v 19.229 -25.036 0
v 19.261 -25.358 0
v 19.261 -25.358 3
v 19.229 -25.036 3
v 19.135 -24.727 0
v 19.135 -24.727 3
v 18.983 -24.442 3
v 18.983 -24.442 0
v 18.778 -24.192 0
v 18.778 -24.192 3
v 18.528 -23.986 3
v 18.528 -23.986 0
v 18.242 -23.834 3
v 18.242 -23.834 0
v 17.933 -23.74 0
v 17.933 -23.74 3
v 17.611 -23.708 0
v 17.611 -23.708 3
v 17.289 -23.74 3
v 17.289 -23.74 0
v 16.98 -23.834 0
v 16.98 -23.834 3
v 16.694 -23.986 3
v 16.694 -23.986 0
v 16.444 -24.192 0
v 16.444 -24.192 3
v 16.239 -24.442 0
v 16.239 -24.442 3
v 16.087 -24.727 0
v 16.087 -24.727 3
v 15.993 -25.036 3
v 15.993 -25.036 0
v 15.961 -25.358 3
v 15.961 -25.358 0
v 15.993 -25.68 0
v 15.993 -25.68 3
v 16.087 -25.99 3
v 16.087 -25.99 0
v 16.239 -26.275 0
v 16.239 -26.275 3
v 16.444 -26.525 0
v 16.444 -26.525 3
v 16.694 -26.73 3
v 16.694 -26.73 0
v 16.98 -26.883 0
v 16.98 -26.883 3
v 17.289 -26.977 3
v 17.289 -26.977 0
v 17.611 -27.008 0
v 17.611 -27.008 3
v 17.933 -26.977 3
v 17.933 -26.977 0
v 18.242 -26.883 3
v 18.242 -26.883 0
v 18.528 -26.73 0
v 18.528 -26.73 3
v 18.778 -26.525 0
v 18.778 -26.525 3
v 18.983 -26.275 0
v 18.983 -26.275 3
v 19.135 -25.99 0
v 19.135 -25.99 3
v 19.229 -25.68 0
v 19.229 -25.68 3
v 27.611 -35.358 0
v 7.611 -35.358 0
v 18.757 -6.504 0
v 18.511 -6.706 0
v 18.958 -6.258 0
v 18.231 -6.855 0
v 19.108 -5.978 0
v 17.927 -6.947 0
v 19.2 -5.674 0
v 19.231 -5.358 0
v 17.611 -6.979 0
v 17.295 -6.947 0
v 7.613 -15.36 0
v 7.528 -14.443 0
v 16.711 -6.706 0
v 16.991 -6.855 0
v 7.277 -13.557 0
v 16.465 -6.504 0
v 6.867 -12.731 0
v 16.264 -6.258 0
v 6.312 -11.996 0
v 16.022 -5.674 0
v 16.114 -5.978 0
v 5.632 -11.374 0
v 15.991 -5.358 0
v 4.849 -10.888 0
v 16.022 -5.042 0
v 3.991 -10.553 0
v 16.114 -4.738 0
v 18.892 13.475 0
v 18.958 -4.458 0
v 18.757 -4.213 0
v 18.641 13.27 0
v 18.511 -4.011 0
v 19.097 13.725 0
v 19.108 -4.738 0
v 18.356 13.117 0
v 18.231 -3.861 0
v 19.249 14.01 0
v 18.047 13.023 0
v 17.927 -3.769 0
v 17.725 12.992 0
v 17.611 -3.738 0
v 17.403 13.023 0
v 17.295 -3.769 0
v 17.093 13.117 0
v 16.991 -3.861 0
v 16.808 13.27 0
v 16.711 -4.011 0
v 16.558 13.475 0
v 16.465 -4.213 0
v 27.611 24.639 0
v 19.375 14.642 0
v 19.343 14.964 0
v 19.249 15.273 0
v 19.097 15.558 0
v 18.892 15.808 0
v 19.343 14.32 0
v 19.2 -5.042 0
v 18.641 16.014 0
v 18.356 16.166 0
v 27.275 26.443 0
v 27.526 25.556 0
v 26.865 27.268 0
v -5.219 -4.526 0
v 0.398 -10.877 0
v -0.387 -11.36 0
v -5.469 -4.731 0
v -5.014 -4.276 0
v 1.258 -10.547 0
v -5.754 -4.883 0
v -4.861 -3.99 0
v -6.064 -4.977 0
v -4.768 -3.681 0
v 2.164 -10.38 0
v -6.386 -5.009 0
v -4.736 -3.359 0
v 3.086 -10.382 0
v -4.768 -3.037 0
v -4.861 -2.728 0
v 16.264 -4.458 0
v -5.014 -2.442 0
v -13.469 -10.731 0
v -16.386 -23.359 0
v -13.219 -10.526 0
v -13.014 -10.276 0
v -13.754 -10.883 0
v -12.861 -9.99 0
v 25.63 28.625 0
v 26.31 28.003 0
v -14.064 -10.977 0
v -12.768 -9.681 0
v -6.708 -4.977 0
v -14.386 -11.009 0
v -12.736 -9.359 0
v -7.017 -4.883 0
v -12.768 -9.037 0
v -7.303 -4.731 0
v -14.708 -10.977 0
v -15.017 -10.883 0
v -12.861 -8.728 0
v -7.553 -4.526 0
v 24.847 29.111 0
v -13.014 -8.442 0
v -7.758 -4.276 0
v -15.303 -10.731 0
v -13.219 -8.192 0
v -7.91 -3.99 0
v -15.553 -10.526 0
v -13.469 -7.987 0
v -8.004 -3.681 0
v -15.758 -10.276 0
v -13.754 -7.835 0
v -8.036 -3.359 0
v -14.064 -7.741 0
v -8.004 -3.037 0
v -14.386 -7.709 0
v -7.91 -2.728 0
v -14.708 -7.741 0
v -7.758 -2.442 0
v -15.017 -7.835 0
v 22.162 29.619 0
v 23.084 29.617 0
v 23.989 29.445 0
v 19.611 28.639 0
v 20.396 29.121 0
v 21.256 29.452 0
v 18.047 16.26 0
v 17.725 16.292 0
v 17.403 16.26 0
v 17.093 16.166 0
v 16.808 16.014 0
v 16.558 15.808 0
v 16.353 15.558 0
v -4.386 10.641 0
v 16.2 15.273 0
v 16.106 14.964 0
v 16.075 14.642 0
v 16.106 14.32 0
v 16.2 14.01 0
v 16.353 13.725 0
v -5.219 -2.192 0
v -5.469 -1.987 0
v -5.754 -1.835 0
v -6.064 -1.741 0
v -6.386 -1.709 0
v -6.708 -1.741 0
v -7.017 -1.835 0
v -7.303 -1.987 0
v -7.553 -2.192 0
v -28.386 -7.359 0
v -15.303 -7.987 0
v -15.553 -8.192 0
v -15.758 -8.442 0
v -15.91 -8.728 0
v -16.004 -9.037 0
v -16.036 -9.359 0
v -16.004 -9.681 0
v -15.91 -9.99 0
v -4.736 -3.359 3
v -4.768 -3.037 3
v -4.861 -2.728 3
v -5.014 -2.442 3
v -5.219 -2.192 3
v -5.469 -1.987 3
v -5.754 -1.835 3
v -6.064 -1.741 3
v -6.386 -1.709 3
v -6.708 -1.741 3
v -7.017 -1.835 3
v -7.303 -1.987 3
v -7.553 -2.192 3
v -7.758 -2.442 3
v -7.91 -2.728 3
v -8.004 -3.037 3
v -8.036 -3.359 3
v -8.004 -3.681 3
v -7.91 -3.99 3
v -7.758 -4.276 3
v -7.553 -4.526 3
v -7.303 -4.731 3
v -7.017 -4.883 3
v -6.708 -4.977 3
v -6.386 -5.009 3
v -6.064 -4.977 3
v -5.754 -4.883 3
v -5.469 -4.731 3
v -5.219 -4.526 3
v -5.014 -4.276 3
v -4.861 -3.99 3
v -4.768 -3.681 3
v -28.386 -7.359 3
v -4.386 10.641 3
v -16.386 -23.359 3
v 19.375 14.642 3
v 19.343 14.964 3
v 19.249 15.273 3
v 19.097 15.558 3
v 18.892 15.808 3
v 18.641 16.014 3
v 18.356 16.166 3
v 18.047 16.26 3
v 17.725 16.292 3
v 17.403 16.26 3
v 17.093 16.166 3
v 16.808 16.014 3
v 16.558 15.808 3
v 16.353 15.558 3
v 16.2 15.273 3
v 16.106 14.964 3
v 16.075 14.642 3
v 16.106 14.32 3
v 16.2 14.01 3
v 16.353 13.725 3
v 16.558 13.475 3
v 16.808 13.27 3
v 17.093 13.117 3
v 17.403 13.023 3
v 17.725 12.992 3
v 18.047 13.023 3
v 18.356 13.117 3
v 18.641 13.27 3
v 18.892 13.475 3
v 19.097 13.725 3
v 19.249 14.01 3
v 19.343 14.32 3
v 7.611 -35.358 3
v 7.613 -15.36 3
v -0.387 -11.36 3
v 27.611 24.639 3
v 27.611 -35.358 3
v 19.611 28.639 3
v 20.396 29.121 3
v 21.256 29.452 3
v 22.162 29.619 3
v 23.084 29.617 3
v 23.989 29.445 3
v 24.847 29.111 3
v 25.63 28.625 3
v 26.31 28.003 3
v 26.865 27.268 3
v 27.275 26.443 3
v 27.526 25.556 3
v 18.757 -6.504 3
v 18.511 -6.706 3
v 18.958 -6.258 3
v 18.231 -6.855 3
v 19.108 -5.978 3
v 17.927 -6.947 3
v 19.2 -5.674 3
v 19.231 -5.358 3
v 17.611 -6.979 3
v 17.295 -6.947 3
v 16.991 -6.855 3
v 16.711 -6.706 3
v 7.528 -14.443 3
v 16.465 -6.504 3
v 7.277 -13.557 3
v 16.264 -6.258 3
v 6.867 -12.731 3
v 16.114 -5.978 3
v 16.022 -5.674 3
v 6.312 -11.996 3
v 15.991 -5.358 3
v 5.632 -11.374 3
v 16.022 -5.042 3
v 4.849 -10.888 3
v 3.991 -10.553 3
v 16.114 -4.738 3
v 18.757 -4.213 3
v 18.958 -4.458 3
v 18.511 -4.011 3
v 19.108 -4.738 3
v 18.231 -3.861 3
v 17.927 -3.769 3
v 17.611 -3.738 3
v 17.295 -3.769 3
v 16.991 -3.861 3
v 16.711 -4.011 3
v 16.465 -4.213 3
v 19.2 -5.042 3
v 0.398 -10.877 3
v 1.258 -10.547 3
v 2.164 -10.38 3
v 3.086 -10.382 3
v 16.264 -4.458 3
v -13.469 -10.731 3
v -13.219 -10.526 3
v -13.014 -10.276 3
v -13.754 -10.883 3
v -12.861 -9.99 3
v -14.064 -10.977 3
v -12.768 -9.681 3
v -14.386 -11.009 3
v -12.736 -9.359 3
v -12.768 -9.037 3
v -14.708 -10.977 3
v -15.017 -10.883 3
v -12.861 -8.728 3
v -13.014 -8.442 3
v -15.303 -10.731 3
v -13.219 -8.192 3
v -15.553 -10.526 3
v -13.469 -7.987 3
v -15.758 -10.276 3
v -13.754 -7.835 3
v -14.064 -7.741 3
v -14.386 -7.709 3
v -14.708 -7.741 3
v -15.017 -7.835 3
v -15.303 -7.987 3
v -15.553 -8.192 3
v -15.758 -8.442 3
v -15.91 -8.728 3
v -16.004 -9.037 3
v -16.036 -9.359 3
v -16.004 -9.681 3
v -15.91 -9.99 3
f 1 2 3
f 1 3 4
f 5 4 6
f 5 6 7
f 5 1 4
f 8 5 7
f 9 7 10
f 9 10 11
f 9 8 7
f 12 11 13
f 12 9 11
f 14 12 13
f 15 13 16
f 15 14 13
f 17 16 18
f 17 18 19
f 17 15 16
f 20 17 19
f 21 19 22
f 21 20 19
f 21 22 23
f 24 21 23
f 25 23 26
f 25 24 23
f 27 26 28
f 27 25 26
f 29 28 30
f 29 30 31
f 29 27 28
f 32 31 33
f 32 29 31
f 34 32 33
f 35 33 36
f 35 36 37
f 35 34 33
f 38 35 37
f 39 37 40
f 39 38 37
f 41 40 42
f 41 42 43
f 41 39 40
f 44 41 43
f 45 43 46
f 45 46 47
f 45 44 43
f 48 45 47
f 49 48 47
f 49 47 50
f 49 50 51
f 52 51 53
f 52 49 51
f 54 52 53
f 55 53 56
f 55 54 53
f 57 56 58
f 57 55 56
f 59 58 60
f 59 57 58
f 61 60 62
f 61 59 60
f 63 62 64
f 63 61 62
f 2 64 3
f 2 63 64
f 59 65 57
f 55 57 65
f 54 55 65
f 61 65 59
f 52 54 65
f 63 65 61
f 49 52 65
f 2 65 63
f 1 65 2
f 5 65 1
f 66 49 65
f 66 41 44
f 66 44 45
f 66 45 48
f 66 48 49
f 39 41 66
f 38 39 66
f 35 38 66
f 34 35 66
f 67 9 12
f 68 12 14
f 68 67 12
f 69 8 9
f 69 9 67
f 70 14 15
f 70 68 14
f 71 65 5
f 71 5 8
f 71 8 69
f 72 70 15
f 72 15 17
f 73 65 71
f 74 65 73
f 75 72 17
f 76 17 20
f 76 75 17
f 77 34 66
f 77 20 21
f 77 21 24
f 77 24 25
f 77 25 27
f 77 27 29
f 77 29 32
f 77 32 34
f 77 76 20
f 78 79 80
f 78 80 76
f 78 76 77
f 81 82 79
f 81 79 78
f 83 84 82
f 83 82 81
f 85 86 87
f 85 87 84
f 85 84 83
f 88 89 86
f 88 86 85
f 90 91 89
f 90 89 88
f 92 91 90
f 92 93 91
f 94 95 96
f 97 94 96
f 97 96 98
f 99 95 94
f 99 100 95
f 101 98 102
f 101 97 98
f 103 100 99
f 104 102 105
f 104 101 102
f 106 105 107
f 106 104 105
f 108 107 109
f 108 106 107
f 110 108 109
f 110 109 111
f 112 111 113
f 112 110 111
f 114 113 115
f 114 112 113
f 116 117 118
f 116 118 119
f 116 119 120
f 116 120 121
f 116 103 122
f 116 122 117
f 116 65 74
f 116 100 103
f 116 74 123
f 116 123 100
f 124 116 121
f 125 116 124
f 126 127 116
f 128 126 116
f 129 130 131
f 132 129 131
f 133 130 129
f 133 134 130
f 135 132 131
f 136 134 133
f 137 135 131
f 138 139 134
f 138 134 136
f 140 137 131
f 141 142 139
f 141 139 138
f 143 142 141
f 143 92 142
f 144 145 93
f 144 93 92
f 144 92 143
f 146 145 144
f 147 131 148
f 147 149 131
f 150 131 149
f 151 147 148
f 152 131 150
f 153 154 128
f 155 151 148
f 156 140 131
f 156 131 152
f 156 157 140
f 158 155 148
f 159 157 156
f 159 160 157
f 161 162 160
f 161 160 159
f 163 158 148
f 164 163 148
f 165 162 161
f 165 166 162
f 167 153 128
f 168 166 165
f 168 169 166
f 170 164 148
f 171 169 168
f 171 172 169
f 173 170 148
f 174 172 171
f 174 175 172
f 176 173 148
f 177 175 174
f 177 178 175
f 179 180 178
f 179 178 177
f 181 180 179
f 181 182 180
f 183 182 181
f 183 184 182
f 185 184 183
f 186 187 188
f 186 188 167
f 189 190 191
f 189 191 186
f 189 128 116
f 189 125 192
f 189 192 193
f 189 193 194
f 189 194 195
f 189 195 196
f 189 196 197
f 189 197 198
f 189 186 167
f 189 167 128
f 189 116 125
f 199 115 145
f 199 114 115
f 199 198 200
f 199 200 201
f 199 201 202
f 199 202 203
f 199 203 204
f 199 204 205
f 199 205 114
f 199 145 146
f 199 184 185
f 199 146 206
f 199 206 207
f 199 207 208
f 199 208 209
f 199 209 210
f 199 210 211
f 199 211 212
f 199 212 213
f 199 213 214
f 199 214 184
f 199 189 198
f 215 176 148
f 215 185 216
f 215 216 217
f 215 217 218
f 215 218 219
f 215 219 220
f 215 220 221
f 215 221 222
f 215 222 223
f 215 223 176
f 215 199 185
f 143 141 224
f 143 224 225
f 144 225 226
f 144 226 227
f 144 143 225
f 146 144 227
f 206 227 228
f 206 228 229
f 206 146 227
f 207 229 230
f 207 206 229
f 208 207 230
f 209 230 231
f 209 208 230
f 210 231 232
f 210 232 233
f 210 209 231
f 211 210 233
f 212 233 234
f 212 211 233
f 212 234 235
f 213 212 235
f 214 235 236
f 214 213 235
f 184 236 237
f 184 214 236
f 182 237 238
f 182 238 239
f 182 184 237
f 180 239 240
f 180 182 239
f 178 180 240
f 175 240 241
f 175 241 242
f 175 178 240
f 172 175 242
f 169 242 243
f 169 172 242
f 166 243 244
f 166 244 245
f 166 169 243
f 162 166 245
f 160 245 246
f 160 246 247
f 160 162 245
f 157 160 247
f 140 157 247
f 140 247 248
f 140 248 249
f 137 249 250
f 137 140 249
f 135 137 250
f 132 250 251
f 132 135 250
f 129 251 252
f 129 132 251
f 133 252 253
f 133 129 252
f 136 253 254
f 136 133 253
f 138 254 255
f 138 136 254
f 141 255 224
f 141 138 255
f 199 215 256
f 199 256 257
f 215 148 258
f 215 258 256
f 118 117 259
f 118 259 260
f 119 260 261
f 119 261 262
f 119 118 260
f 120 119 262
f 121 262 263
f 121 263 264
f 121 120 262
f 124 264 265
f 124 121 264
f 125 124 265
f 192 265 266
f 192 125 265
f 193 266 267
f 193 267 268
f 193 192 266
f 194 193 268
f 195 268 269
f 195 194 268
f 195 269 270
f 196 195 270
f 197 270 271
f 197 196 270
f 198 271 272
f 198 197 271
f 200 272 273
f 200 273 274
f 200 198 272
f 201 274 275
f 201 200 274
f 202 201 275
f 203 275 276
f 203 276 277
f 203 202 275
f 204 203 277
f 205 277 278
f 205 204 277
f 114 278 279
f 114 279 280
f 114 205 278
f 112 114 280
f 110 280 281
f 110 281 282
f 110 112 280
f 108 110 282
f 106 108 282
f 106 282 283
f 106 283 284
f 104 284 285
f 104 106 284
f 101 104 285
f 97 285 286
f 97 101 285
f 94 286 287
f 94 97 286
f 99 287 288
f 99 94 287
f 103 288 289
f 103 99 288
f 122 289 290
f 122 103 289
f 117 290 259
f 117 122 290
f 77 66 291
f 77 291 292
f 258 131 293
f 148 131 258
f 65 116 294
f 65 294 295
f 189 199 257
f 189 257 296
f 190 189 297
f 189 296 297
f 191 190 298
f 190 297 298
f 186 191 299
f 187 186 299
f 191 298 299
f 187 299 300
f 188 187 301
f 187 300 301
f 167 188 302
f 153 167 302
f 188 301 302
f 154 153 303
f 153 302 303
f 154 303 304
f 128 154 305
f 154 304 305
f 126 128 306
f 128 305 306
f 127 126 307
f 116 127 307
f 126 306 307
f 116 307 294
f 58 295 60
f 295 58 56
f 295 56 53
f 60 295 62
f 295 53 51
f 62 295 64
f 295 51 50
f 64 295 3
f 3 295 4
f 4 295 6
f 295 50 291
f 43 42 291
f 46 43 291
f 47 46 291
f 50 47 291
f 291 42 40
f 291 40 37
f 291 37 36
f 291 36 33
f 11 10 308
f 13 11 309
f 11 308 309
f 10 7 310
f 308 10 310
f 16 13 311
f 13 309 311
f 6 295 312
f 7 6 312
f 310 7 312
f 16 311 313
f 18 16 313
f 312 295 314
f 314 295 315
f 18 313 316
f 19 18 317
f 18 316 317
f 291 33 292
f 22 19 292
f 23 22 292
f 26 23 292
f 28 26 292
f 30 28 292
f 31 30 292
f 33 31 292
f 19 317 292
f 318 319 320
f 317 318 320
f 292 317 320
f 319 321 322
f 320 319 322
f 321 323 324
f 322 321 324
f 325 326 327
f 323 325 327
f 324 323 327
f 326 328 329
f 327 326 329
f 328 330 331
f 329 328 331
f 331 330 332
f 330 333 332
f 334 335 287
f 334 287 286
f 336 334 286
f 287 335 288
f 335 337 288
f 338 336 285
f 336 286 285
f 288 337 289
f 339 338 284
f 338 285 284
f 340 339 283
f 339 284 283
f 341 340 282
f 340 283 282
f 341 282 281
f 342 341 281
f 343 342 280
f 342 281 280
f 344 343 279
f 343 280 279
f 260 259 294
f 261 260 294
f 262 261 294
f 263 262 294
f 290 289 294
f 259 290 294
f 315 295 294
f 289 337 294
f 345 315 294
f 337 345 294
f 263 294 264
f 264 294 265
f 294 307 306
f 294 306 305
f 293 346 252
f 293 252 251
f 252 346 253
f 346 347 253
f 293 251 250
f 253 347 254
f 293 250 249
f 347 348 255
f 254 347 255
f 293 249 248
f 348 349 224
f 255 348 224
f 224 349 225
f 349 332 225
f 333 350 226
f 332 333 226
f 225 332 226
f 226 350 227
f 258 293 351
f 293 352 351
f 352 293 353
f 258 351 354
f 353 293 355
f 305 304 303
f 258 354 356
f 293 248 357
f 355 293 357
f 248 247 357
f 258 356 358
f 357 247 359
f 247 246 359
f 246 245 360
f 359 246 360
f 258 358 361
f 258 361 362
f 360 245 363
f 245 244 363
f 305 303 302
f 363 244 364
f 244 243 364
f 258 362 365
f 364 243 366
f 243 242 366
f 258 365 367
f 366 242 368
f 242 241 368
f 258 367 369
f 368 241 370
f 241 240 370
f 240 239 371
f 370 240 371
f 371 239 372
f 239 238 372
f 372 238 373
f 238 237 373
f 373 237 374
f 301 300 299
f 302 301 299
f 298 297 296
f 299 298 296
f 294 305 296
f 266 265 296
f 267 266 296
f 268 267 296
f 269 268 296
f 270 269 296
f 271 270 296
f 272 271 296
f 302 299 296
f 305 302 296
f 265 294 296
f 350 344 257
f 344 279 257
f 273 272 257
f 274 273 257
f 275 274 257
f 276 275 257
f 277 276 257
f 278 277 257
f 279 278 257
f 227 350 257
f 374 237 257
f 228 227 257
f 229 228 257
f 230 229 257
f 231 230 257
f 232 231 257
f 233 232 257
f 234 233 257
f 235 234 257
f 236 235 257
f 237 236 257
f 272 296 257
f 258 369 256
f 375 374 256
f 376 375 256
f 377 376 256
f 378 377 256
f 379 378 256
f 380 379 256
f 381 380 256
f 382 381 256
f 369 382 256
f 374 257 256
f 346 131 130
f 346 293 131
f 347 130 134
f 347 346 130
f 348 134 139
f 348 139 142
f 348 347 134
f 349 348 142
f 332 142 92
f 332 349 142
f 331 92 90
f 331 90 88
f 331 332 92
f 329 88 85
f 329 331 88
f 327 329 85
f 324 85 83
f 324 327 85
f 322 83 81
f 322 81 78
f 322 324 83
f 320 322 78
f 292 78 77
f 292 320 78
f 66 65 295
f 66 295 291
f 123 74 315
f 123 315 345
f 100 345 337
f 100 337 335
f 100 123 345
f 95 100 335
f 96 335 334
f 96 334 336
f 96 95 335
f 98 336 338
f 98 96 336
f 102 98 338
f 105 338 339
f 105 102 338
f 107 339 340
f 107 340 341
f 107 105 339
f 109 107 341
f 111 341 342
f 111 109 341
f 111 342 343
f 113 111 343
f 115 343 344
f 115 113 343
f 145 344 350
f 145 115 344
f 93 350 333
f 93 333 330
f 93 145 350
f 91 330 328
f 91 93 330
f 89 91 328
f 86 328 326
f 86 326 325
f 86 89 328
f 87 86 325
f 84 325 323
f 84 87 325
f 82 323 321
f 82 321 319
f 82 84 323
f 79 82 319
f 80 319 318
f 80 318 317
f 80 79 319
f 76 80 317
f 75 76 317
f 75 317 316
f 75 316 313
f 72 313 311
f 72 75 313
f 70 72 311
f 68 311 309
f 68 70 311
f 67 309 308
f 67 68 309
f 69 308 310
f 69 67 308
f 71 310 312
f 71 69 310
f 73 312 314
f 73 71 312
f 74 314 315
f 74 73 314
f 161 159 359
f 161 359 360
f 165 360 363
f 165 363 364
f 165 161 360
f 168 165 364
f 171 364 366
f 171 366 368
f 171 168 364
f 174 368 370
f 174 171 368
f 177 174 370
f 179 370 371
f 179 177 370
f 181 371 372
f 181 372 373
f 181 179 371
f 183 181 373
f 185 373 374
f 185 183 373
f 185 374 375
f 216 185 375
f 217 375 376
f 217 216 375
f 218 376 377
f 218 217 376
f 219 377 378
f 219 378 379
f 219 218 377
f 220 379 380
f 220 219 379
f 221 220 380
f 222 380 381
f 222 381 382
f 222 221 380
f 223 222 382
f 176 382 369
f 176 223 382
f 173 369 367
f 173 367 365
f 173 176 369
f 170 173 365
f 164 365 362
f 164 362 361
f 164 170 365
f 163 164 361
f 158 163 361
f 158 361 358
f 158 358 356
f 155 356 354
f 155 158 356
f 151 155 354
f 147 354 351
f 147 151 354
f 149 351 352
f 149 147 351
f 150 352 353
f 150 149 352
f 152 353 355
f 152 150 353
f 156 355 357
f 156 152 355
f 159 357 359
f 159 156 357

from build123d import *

# Parameters (mm, degrees)
SKETCH_1_R      = 1.65
SKETCH_1_R_2    = 1.620295374
EXTRUDE_1_DEPTH = 3
FILLET_1_R      = 5


with BuildPart() as part:
    # 草图1 → 凸台-拉伸1 (new body)
    with BuildSketch(Plane.XY):
        Polygon((-4.38586222, 10.641032467), (27.611336651, 34.638936735), (27.610889092, -35.358299417), (7.610889171, -35.358299417), (7.614139416, -5.358966306), (-16.385858742, -23.358968761), (-28.385860379, -7.358969988), align=None)
        with Locations((17.724788113, 14.641700583)):
            Circle(SKETCH_1_R, mode=Mode.SUBTRACT)
        with Locations((17.610953032, -5.358299417)):
            Circle(SKETCH_1_R_2, mode=Mode.SUBTRACT)
        with Locations((17.610953032, -25.358299417)):
            Circle(SKETCH_1_R, mode=Mode.SUBTRACT)
        with Locations((-6.385860788, -3.358967738)):
            Circle(SKETCH_1_R, mode=Mode.SUBTRACT)
        with Locations((-14.385860174, -9.358968556)):
            Circle(SKETCH_1_R, mode=Mode.SUBTRACT)
    extrude(amount=EXTRUDE_1_DEPTH)

    # 圆角1
    fillet_1_edges = [part.edges().sort_by_distance(p)[0] for p in [
        (27.611336651, 34.638936735, 1.5),
        (7.614139416, -5.358966306, 1.5),
    ]]
    fillet(fillet_1_edges, radius=FILLET_1_R)


solid = part.part
